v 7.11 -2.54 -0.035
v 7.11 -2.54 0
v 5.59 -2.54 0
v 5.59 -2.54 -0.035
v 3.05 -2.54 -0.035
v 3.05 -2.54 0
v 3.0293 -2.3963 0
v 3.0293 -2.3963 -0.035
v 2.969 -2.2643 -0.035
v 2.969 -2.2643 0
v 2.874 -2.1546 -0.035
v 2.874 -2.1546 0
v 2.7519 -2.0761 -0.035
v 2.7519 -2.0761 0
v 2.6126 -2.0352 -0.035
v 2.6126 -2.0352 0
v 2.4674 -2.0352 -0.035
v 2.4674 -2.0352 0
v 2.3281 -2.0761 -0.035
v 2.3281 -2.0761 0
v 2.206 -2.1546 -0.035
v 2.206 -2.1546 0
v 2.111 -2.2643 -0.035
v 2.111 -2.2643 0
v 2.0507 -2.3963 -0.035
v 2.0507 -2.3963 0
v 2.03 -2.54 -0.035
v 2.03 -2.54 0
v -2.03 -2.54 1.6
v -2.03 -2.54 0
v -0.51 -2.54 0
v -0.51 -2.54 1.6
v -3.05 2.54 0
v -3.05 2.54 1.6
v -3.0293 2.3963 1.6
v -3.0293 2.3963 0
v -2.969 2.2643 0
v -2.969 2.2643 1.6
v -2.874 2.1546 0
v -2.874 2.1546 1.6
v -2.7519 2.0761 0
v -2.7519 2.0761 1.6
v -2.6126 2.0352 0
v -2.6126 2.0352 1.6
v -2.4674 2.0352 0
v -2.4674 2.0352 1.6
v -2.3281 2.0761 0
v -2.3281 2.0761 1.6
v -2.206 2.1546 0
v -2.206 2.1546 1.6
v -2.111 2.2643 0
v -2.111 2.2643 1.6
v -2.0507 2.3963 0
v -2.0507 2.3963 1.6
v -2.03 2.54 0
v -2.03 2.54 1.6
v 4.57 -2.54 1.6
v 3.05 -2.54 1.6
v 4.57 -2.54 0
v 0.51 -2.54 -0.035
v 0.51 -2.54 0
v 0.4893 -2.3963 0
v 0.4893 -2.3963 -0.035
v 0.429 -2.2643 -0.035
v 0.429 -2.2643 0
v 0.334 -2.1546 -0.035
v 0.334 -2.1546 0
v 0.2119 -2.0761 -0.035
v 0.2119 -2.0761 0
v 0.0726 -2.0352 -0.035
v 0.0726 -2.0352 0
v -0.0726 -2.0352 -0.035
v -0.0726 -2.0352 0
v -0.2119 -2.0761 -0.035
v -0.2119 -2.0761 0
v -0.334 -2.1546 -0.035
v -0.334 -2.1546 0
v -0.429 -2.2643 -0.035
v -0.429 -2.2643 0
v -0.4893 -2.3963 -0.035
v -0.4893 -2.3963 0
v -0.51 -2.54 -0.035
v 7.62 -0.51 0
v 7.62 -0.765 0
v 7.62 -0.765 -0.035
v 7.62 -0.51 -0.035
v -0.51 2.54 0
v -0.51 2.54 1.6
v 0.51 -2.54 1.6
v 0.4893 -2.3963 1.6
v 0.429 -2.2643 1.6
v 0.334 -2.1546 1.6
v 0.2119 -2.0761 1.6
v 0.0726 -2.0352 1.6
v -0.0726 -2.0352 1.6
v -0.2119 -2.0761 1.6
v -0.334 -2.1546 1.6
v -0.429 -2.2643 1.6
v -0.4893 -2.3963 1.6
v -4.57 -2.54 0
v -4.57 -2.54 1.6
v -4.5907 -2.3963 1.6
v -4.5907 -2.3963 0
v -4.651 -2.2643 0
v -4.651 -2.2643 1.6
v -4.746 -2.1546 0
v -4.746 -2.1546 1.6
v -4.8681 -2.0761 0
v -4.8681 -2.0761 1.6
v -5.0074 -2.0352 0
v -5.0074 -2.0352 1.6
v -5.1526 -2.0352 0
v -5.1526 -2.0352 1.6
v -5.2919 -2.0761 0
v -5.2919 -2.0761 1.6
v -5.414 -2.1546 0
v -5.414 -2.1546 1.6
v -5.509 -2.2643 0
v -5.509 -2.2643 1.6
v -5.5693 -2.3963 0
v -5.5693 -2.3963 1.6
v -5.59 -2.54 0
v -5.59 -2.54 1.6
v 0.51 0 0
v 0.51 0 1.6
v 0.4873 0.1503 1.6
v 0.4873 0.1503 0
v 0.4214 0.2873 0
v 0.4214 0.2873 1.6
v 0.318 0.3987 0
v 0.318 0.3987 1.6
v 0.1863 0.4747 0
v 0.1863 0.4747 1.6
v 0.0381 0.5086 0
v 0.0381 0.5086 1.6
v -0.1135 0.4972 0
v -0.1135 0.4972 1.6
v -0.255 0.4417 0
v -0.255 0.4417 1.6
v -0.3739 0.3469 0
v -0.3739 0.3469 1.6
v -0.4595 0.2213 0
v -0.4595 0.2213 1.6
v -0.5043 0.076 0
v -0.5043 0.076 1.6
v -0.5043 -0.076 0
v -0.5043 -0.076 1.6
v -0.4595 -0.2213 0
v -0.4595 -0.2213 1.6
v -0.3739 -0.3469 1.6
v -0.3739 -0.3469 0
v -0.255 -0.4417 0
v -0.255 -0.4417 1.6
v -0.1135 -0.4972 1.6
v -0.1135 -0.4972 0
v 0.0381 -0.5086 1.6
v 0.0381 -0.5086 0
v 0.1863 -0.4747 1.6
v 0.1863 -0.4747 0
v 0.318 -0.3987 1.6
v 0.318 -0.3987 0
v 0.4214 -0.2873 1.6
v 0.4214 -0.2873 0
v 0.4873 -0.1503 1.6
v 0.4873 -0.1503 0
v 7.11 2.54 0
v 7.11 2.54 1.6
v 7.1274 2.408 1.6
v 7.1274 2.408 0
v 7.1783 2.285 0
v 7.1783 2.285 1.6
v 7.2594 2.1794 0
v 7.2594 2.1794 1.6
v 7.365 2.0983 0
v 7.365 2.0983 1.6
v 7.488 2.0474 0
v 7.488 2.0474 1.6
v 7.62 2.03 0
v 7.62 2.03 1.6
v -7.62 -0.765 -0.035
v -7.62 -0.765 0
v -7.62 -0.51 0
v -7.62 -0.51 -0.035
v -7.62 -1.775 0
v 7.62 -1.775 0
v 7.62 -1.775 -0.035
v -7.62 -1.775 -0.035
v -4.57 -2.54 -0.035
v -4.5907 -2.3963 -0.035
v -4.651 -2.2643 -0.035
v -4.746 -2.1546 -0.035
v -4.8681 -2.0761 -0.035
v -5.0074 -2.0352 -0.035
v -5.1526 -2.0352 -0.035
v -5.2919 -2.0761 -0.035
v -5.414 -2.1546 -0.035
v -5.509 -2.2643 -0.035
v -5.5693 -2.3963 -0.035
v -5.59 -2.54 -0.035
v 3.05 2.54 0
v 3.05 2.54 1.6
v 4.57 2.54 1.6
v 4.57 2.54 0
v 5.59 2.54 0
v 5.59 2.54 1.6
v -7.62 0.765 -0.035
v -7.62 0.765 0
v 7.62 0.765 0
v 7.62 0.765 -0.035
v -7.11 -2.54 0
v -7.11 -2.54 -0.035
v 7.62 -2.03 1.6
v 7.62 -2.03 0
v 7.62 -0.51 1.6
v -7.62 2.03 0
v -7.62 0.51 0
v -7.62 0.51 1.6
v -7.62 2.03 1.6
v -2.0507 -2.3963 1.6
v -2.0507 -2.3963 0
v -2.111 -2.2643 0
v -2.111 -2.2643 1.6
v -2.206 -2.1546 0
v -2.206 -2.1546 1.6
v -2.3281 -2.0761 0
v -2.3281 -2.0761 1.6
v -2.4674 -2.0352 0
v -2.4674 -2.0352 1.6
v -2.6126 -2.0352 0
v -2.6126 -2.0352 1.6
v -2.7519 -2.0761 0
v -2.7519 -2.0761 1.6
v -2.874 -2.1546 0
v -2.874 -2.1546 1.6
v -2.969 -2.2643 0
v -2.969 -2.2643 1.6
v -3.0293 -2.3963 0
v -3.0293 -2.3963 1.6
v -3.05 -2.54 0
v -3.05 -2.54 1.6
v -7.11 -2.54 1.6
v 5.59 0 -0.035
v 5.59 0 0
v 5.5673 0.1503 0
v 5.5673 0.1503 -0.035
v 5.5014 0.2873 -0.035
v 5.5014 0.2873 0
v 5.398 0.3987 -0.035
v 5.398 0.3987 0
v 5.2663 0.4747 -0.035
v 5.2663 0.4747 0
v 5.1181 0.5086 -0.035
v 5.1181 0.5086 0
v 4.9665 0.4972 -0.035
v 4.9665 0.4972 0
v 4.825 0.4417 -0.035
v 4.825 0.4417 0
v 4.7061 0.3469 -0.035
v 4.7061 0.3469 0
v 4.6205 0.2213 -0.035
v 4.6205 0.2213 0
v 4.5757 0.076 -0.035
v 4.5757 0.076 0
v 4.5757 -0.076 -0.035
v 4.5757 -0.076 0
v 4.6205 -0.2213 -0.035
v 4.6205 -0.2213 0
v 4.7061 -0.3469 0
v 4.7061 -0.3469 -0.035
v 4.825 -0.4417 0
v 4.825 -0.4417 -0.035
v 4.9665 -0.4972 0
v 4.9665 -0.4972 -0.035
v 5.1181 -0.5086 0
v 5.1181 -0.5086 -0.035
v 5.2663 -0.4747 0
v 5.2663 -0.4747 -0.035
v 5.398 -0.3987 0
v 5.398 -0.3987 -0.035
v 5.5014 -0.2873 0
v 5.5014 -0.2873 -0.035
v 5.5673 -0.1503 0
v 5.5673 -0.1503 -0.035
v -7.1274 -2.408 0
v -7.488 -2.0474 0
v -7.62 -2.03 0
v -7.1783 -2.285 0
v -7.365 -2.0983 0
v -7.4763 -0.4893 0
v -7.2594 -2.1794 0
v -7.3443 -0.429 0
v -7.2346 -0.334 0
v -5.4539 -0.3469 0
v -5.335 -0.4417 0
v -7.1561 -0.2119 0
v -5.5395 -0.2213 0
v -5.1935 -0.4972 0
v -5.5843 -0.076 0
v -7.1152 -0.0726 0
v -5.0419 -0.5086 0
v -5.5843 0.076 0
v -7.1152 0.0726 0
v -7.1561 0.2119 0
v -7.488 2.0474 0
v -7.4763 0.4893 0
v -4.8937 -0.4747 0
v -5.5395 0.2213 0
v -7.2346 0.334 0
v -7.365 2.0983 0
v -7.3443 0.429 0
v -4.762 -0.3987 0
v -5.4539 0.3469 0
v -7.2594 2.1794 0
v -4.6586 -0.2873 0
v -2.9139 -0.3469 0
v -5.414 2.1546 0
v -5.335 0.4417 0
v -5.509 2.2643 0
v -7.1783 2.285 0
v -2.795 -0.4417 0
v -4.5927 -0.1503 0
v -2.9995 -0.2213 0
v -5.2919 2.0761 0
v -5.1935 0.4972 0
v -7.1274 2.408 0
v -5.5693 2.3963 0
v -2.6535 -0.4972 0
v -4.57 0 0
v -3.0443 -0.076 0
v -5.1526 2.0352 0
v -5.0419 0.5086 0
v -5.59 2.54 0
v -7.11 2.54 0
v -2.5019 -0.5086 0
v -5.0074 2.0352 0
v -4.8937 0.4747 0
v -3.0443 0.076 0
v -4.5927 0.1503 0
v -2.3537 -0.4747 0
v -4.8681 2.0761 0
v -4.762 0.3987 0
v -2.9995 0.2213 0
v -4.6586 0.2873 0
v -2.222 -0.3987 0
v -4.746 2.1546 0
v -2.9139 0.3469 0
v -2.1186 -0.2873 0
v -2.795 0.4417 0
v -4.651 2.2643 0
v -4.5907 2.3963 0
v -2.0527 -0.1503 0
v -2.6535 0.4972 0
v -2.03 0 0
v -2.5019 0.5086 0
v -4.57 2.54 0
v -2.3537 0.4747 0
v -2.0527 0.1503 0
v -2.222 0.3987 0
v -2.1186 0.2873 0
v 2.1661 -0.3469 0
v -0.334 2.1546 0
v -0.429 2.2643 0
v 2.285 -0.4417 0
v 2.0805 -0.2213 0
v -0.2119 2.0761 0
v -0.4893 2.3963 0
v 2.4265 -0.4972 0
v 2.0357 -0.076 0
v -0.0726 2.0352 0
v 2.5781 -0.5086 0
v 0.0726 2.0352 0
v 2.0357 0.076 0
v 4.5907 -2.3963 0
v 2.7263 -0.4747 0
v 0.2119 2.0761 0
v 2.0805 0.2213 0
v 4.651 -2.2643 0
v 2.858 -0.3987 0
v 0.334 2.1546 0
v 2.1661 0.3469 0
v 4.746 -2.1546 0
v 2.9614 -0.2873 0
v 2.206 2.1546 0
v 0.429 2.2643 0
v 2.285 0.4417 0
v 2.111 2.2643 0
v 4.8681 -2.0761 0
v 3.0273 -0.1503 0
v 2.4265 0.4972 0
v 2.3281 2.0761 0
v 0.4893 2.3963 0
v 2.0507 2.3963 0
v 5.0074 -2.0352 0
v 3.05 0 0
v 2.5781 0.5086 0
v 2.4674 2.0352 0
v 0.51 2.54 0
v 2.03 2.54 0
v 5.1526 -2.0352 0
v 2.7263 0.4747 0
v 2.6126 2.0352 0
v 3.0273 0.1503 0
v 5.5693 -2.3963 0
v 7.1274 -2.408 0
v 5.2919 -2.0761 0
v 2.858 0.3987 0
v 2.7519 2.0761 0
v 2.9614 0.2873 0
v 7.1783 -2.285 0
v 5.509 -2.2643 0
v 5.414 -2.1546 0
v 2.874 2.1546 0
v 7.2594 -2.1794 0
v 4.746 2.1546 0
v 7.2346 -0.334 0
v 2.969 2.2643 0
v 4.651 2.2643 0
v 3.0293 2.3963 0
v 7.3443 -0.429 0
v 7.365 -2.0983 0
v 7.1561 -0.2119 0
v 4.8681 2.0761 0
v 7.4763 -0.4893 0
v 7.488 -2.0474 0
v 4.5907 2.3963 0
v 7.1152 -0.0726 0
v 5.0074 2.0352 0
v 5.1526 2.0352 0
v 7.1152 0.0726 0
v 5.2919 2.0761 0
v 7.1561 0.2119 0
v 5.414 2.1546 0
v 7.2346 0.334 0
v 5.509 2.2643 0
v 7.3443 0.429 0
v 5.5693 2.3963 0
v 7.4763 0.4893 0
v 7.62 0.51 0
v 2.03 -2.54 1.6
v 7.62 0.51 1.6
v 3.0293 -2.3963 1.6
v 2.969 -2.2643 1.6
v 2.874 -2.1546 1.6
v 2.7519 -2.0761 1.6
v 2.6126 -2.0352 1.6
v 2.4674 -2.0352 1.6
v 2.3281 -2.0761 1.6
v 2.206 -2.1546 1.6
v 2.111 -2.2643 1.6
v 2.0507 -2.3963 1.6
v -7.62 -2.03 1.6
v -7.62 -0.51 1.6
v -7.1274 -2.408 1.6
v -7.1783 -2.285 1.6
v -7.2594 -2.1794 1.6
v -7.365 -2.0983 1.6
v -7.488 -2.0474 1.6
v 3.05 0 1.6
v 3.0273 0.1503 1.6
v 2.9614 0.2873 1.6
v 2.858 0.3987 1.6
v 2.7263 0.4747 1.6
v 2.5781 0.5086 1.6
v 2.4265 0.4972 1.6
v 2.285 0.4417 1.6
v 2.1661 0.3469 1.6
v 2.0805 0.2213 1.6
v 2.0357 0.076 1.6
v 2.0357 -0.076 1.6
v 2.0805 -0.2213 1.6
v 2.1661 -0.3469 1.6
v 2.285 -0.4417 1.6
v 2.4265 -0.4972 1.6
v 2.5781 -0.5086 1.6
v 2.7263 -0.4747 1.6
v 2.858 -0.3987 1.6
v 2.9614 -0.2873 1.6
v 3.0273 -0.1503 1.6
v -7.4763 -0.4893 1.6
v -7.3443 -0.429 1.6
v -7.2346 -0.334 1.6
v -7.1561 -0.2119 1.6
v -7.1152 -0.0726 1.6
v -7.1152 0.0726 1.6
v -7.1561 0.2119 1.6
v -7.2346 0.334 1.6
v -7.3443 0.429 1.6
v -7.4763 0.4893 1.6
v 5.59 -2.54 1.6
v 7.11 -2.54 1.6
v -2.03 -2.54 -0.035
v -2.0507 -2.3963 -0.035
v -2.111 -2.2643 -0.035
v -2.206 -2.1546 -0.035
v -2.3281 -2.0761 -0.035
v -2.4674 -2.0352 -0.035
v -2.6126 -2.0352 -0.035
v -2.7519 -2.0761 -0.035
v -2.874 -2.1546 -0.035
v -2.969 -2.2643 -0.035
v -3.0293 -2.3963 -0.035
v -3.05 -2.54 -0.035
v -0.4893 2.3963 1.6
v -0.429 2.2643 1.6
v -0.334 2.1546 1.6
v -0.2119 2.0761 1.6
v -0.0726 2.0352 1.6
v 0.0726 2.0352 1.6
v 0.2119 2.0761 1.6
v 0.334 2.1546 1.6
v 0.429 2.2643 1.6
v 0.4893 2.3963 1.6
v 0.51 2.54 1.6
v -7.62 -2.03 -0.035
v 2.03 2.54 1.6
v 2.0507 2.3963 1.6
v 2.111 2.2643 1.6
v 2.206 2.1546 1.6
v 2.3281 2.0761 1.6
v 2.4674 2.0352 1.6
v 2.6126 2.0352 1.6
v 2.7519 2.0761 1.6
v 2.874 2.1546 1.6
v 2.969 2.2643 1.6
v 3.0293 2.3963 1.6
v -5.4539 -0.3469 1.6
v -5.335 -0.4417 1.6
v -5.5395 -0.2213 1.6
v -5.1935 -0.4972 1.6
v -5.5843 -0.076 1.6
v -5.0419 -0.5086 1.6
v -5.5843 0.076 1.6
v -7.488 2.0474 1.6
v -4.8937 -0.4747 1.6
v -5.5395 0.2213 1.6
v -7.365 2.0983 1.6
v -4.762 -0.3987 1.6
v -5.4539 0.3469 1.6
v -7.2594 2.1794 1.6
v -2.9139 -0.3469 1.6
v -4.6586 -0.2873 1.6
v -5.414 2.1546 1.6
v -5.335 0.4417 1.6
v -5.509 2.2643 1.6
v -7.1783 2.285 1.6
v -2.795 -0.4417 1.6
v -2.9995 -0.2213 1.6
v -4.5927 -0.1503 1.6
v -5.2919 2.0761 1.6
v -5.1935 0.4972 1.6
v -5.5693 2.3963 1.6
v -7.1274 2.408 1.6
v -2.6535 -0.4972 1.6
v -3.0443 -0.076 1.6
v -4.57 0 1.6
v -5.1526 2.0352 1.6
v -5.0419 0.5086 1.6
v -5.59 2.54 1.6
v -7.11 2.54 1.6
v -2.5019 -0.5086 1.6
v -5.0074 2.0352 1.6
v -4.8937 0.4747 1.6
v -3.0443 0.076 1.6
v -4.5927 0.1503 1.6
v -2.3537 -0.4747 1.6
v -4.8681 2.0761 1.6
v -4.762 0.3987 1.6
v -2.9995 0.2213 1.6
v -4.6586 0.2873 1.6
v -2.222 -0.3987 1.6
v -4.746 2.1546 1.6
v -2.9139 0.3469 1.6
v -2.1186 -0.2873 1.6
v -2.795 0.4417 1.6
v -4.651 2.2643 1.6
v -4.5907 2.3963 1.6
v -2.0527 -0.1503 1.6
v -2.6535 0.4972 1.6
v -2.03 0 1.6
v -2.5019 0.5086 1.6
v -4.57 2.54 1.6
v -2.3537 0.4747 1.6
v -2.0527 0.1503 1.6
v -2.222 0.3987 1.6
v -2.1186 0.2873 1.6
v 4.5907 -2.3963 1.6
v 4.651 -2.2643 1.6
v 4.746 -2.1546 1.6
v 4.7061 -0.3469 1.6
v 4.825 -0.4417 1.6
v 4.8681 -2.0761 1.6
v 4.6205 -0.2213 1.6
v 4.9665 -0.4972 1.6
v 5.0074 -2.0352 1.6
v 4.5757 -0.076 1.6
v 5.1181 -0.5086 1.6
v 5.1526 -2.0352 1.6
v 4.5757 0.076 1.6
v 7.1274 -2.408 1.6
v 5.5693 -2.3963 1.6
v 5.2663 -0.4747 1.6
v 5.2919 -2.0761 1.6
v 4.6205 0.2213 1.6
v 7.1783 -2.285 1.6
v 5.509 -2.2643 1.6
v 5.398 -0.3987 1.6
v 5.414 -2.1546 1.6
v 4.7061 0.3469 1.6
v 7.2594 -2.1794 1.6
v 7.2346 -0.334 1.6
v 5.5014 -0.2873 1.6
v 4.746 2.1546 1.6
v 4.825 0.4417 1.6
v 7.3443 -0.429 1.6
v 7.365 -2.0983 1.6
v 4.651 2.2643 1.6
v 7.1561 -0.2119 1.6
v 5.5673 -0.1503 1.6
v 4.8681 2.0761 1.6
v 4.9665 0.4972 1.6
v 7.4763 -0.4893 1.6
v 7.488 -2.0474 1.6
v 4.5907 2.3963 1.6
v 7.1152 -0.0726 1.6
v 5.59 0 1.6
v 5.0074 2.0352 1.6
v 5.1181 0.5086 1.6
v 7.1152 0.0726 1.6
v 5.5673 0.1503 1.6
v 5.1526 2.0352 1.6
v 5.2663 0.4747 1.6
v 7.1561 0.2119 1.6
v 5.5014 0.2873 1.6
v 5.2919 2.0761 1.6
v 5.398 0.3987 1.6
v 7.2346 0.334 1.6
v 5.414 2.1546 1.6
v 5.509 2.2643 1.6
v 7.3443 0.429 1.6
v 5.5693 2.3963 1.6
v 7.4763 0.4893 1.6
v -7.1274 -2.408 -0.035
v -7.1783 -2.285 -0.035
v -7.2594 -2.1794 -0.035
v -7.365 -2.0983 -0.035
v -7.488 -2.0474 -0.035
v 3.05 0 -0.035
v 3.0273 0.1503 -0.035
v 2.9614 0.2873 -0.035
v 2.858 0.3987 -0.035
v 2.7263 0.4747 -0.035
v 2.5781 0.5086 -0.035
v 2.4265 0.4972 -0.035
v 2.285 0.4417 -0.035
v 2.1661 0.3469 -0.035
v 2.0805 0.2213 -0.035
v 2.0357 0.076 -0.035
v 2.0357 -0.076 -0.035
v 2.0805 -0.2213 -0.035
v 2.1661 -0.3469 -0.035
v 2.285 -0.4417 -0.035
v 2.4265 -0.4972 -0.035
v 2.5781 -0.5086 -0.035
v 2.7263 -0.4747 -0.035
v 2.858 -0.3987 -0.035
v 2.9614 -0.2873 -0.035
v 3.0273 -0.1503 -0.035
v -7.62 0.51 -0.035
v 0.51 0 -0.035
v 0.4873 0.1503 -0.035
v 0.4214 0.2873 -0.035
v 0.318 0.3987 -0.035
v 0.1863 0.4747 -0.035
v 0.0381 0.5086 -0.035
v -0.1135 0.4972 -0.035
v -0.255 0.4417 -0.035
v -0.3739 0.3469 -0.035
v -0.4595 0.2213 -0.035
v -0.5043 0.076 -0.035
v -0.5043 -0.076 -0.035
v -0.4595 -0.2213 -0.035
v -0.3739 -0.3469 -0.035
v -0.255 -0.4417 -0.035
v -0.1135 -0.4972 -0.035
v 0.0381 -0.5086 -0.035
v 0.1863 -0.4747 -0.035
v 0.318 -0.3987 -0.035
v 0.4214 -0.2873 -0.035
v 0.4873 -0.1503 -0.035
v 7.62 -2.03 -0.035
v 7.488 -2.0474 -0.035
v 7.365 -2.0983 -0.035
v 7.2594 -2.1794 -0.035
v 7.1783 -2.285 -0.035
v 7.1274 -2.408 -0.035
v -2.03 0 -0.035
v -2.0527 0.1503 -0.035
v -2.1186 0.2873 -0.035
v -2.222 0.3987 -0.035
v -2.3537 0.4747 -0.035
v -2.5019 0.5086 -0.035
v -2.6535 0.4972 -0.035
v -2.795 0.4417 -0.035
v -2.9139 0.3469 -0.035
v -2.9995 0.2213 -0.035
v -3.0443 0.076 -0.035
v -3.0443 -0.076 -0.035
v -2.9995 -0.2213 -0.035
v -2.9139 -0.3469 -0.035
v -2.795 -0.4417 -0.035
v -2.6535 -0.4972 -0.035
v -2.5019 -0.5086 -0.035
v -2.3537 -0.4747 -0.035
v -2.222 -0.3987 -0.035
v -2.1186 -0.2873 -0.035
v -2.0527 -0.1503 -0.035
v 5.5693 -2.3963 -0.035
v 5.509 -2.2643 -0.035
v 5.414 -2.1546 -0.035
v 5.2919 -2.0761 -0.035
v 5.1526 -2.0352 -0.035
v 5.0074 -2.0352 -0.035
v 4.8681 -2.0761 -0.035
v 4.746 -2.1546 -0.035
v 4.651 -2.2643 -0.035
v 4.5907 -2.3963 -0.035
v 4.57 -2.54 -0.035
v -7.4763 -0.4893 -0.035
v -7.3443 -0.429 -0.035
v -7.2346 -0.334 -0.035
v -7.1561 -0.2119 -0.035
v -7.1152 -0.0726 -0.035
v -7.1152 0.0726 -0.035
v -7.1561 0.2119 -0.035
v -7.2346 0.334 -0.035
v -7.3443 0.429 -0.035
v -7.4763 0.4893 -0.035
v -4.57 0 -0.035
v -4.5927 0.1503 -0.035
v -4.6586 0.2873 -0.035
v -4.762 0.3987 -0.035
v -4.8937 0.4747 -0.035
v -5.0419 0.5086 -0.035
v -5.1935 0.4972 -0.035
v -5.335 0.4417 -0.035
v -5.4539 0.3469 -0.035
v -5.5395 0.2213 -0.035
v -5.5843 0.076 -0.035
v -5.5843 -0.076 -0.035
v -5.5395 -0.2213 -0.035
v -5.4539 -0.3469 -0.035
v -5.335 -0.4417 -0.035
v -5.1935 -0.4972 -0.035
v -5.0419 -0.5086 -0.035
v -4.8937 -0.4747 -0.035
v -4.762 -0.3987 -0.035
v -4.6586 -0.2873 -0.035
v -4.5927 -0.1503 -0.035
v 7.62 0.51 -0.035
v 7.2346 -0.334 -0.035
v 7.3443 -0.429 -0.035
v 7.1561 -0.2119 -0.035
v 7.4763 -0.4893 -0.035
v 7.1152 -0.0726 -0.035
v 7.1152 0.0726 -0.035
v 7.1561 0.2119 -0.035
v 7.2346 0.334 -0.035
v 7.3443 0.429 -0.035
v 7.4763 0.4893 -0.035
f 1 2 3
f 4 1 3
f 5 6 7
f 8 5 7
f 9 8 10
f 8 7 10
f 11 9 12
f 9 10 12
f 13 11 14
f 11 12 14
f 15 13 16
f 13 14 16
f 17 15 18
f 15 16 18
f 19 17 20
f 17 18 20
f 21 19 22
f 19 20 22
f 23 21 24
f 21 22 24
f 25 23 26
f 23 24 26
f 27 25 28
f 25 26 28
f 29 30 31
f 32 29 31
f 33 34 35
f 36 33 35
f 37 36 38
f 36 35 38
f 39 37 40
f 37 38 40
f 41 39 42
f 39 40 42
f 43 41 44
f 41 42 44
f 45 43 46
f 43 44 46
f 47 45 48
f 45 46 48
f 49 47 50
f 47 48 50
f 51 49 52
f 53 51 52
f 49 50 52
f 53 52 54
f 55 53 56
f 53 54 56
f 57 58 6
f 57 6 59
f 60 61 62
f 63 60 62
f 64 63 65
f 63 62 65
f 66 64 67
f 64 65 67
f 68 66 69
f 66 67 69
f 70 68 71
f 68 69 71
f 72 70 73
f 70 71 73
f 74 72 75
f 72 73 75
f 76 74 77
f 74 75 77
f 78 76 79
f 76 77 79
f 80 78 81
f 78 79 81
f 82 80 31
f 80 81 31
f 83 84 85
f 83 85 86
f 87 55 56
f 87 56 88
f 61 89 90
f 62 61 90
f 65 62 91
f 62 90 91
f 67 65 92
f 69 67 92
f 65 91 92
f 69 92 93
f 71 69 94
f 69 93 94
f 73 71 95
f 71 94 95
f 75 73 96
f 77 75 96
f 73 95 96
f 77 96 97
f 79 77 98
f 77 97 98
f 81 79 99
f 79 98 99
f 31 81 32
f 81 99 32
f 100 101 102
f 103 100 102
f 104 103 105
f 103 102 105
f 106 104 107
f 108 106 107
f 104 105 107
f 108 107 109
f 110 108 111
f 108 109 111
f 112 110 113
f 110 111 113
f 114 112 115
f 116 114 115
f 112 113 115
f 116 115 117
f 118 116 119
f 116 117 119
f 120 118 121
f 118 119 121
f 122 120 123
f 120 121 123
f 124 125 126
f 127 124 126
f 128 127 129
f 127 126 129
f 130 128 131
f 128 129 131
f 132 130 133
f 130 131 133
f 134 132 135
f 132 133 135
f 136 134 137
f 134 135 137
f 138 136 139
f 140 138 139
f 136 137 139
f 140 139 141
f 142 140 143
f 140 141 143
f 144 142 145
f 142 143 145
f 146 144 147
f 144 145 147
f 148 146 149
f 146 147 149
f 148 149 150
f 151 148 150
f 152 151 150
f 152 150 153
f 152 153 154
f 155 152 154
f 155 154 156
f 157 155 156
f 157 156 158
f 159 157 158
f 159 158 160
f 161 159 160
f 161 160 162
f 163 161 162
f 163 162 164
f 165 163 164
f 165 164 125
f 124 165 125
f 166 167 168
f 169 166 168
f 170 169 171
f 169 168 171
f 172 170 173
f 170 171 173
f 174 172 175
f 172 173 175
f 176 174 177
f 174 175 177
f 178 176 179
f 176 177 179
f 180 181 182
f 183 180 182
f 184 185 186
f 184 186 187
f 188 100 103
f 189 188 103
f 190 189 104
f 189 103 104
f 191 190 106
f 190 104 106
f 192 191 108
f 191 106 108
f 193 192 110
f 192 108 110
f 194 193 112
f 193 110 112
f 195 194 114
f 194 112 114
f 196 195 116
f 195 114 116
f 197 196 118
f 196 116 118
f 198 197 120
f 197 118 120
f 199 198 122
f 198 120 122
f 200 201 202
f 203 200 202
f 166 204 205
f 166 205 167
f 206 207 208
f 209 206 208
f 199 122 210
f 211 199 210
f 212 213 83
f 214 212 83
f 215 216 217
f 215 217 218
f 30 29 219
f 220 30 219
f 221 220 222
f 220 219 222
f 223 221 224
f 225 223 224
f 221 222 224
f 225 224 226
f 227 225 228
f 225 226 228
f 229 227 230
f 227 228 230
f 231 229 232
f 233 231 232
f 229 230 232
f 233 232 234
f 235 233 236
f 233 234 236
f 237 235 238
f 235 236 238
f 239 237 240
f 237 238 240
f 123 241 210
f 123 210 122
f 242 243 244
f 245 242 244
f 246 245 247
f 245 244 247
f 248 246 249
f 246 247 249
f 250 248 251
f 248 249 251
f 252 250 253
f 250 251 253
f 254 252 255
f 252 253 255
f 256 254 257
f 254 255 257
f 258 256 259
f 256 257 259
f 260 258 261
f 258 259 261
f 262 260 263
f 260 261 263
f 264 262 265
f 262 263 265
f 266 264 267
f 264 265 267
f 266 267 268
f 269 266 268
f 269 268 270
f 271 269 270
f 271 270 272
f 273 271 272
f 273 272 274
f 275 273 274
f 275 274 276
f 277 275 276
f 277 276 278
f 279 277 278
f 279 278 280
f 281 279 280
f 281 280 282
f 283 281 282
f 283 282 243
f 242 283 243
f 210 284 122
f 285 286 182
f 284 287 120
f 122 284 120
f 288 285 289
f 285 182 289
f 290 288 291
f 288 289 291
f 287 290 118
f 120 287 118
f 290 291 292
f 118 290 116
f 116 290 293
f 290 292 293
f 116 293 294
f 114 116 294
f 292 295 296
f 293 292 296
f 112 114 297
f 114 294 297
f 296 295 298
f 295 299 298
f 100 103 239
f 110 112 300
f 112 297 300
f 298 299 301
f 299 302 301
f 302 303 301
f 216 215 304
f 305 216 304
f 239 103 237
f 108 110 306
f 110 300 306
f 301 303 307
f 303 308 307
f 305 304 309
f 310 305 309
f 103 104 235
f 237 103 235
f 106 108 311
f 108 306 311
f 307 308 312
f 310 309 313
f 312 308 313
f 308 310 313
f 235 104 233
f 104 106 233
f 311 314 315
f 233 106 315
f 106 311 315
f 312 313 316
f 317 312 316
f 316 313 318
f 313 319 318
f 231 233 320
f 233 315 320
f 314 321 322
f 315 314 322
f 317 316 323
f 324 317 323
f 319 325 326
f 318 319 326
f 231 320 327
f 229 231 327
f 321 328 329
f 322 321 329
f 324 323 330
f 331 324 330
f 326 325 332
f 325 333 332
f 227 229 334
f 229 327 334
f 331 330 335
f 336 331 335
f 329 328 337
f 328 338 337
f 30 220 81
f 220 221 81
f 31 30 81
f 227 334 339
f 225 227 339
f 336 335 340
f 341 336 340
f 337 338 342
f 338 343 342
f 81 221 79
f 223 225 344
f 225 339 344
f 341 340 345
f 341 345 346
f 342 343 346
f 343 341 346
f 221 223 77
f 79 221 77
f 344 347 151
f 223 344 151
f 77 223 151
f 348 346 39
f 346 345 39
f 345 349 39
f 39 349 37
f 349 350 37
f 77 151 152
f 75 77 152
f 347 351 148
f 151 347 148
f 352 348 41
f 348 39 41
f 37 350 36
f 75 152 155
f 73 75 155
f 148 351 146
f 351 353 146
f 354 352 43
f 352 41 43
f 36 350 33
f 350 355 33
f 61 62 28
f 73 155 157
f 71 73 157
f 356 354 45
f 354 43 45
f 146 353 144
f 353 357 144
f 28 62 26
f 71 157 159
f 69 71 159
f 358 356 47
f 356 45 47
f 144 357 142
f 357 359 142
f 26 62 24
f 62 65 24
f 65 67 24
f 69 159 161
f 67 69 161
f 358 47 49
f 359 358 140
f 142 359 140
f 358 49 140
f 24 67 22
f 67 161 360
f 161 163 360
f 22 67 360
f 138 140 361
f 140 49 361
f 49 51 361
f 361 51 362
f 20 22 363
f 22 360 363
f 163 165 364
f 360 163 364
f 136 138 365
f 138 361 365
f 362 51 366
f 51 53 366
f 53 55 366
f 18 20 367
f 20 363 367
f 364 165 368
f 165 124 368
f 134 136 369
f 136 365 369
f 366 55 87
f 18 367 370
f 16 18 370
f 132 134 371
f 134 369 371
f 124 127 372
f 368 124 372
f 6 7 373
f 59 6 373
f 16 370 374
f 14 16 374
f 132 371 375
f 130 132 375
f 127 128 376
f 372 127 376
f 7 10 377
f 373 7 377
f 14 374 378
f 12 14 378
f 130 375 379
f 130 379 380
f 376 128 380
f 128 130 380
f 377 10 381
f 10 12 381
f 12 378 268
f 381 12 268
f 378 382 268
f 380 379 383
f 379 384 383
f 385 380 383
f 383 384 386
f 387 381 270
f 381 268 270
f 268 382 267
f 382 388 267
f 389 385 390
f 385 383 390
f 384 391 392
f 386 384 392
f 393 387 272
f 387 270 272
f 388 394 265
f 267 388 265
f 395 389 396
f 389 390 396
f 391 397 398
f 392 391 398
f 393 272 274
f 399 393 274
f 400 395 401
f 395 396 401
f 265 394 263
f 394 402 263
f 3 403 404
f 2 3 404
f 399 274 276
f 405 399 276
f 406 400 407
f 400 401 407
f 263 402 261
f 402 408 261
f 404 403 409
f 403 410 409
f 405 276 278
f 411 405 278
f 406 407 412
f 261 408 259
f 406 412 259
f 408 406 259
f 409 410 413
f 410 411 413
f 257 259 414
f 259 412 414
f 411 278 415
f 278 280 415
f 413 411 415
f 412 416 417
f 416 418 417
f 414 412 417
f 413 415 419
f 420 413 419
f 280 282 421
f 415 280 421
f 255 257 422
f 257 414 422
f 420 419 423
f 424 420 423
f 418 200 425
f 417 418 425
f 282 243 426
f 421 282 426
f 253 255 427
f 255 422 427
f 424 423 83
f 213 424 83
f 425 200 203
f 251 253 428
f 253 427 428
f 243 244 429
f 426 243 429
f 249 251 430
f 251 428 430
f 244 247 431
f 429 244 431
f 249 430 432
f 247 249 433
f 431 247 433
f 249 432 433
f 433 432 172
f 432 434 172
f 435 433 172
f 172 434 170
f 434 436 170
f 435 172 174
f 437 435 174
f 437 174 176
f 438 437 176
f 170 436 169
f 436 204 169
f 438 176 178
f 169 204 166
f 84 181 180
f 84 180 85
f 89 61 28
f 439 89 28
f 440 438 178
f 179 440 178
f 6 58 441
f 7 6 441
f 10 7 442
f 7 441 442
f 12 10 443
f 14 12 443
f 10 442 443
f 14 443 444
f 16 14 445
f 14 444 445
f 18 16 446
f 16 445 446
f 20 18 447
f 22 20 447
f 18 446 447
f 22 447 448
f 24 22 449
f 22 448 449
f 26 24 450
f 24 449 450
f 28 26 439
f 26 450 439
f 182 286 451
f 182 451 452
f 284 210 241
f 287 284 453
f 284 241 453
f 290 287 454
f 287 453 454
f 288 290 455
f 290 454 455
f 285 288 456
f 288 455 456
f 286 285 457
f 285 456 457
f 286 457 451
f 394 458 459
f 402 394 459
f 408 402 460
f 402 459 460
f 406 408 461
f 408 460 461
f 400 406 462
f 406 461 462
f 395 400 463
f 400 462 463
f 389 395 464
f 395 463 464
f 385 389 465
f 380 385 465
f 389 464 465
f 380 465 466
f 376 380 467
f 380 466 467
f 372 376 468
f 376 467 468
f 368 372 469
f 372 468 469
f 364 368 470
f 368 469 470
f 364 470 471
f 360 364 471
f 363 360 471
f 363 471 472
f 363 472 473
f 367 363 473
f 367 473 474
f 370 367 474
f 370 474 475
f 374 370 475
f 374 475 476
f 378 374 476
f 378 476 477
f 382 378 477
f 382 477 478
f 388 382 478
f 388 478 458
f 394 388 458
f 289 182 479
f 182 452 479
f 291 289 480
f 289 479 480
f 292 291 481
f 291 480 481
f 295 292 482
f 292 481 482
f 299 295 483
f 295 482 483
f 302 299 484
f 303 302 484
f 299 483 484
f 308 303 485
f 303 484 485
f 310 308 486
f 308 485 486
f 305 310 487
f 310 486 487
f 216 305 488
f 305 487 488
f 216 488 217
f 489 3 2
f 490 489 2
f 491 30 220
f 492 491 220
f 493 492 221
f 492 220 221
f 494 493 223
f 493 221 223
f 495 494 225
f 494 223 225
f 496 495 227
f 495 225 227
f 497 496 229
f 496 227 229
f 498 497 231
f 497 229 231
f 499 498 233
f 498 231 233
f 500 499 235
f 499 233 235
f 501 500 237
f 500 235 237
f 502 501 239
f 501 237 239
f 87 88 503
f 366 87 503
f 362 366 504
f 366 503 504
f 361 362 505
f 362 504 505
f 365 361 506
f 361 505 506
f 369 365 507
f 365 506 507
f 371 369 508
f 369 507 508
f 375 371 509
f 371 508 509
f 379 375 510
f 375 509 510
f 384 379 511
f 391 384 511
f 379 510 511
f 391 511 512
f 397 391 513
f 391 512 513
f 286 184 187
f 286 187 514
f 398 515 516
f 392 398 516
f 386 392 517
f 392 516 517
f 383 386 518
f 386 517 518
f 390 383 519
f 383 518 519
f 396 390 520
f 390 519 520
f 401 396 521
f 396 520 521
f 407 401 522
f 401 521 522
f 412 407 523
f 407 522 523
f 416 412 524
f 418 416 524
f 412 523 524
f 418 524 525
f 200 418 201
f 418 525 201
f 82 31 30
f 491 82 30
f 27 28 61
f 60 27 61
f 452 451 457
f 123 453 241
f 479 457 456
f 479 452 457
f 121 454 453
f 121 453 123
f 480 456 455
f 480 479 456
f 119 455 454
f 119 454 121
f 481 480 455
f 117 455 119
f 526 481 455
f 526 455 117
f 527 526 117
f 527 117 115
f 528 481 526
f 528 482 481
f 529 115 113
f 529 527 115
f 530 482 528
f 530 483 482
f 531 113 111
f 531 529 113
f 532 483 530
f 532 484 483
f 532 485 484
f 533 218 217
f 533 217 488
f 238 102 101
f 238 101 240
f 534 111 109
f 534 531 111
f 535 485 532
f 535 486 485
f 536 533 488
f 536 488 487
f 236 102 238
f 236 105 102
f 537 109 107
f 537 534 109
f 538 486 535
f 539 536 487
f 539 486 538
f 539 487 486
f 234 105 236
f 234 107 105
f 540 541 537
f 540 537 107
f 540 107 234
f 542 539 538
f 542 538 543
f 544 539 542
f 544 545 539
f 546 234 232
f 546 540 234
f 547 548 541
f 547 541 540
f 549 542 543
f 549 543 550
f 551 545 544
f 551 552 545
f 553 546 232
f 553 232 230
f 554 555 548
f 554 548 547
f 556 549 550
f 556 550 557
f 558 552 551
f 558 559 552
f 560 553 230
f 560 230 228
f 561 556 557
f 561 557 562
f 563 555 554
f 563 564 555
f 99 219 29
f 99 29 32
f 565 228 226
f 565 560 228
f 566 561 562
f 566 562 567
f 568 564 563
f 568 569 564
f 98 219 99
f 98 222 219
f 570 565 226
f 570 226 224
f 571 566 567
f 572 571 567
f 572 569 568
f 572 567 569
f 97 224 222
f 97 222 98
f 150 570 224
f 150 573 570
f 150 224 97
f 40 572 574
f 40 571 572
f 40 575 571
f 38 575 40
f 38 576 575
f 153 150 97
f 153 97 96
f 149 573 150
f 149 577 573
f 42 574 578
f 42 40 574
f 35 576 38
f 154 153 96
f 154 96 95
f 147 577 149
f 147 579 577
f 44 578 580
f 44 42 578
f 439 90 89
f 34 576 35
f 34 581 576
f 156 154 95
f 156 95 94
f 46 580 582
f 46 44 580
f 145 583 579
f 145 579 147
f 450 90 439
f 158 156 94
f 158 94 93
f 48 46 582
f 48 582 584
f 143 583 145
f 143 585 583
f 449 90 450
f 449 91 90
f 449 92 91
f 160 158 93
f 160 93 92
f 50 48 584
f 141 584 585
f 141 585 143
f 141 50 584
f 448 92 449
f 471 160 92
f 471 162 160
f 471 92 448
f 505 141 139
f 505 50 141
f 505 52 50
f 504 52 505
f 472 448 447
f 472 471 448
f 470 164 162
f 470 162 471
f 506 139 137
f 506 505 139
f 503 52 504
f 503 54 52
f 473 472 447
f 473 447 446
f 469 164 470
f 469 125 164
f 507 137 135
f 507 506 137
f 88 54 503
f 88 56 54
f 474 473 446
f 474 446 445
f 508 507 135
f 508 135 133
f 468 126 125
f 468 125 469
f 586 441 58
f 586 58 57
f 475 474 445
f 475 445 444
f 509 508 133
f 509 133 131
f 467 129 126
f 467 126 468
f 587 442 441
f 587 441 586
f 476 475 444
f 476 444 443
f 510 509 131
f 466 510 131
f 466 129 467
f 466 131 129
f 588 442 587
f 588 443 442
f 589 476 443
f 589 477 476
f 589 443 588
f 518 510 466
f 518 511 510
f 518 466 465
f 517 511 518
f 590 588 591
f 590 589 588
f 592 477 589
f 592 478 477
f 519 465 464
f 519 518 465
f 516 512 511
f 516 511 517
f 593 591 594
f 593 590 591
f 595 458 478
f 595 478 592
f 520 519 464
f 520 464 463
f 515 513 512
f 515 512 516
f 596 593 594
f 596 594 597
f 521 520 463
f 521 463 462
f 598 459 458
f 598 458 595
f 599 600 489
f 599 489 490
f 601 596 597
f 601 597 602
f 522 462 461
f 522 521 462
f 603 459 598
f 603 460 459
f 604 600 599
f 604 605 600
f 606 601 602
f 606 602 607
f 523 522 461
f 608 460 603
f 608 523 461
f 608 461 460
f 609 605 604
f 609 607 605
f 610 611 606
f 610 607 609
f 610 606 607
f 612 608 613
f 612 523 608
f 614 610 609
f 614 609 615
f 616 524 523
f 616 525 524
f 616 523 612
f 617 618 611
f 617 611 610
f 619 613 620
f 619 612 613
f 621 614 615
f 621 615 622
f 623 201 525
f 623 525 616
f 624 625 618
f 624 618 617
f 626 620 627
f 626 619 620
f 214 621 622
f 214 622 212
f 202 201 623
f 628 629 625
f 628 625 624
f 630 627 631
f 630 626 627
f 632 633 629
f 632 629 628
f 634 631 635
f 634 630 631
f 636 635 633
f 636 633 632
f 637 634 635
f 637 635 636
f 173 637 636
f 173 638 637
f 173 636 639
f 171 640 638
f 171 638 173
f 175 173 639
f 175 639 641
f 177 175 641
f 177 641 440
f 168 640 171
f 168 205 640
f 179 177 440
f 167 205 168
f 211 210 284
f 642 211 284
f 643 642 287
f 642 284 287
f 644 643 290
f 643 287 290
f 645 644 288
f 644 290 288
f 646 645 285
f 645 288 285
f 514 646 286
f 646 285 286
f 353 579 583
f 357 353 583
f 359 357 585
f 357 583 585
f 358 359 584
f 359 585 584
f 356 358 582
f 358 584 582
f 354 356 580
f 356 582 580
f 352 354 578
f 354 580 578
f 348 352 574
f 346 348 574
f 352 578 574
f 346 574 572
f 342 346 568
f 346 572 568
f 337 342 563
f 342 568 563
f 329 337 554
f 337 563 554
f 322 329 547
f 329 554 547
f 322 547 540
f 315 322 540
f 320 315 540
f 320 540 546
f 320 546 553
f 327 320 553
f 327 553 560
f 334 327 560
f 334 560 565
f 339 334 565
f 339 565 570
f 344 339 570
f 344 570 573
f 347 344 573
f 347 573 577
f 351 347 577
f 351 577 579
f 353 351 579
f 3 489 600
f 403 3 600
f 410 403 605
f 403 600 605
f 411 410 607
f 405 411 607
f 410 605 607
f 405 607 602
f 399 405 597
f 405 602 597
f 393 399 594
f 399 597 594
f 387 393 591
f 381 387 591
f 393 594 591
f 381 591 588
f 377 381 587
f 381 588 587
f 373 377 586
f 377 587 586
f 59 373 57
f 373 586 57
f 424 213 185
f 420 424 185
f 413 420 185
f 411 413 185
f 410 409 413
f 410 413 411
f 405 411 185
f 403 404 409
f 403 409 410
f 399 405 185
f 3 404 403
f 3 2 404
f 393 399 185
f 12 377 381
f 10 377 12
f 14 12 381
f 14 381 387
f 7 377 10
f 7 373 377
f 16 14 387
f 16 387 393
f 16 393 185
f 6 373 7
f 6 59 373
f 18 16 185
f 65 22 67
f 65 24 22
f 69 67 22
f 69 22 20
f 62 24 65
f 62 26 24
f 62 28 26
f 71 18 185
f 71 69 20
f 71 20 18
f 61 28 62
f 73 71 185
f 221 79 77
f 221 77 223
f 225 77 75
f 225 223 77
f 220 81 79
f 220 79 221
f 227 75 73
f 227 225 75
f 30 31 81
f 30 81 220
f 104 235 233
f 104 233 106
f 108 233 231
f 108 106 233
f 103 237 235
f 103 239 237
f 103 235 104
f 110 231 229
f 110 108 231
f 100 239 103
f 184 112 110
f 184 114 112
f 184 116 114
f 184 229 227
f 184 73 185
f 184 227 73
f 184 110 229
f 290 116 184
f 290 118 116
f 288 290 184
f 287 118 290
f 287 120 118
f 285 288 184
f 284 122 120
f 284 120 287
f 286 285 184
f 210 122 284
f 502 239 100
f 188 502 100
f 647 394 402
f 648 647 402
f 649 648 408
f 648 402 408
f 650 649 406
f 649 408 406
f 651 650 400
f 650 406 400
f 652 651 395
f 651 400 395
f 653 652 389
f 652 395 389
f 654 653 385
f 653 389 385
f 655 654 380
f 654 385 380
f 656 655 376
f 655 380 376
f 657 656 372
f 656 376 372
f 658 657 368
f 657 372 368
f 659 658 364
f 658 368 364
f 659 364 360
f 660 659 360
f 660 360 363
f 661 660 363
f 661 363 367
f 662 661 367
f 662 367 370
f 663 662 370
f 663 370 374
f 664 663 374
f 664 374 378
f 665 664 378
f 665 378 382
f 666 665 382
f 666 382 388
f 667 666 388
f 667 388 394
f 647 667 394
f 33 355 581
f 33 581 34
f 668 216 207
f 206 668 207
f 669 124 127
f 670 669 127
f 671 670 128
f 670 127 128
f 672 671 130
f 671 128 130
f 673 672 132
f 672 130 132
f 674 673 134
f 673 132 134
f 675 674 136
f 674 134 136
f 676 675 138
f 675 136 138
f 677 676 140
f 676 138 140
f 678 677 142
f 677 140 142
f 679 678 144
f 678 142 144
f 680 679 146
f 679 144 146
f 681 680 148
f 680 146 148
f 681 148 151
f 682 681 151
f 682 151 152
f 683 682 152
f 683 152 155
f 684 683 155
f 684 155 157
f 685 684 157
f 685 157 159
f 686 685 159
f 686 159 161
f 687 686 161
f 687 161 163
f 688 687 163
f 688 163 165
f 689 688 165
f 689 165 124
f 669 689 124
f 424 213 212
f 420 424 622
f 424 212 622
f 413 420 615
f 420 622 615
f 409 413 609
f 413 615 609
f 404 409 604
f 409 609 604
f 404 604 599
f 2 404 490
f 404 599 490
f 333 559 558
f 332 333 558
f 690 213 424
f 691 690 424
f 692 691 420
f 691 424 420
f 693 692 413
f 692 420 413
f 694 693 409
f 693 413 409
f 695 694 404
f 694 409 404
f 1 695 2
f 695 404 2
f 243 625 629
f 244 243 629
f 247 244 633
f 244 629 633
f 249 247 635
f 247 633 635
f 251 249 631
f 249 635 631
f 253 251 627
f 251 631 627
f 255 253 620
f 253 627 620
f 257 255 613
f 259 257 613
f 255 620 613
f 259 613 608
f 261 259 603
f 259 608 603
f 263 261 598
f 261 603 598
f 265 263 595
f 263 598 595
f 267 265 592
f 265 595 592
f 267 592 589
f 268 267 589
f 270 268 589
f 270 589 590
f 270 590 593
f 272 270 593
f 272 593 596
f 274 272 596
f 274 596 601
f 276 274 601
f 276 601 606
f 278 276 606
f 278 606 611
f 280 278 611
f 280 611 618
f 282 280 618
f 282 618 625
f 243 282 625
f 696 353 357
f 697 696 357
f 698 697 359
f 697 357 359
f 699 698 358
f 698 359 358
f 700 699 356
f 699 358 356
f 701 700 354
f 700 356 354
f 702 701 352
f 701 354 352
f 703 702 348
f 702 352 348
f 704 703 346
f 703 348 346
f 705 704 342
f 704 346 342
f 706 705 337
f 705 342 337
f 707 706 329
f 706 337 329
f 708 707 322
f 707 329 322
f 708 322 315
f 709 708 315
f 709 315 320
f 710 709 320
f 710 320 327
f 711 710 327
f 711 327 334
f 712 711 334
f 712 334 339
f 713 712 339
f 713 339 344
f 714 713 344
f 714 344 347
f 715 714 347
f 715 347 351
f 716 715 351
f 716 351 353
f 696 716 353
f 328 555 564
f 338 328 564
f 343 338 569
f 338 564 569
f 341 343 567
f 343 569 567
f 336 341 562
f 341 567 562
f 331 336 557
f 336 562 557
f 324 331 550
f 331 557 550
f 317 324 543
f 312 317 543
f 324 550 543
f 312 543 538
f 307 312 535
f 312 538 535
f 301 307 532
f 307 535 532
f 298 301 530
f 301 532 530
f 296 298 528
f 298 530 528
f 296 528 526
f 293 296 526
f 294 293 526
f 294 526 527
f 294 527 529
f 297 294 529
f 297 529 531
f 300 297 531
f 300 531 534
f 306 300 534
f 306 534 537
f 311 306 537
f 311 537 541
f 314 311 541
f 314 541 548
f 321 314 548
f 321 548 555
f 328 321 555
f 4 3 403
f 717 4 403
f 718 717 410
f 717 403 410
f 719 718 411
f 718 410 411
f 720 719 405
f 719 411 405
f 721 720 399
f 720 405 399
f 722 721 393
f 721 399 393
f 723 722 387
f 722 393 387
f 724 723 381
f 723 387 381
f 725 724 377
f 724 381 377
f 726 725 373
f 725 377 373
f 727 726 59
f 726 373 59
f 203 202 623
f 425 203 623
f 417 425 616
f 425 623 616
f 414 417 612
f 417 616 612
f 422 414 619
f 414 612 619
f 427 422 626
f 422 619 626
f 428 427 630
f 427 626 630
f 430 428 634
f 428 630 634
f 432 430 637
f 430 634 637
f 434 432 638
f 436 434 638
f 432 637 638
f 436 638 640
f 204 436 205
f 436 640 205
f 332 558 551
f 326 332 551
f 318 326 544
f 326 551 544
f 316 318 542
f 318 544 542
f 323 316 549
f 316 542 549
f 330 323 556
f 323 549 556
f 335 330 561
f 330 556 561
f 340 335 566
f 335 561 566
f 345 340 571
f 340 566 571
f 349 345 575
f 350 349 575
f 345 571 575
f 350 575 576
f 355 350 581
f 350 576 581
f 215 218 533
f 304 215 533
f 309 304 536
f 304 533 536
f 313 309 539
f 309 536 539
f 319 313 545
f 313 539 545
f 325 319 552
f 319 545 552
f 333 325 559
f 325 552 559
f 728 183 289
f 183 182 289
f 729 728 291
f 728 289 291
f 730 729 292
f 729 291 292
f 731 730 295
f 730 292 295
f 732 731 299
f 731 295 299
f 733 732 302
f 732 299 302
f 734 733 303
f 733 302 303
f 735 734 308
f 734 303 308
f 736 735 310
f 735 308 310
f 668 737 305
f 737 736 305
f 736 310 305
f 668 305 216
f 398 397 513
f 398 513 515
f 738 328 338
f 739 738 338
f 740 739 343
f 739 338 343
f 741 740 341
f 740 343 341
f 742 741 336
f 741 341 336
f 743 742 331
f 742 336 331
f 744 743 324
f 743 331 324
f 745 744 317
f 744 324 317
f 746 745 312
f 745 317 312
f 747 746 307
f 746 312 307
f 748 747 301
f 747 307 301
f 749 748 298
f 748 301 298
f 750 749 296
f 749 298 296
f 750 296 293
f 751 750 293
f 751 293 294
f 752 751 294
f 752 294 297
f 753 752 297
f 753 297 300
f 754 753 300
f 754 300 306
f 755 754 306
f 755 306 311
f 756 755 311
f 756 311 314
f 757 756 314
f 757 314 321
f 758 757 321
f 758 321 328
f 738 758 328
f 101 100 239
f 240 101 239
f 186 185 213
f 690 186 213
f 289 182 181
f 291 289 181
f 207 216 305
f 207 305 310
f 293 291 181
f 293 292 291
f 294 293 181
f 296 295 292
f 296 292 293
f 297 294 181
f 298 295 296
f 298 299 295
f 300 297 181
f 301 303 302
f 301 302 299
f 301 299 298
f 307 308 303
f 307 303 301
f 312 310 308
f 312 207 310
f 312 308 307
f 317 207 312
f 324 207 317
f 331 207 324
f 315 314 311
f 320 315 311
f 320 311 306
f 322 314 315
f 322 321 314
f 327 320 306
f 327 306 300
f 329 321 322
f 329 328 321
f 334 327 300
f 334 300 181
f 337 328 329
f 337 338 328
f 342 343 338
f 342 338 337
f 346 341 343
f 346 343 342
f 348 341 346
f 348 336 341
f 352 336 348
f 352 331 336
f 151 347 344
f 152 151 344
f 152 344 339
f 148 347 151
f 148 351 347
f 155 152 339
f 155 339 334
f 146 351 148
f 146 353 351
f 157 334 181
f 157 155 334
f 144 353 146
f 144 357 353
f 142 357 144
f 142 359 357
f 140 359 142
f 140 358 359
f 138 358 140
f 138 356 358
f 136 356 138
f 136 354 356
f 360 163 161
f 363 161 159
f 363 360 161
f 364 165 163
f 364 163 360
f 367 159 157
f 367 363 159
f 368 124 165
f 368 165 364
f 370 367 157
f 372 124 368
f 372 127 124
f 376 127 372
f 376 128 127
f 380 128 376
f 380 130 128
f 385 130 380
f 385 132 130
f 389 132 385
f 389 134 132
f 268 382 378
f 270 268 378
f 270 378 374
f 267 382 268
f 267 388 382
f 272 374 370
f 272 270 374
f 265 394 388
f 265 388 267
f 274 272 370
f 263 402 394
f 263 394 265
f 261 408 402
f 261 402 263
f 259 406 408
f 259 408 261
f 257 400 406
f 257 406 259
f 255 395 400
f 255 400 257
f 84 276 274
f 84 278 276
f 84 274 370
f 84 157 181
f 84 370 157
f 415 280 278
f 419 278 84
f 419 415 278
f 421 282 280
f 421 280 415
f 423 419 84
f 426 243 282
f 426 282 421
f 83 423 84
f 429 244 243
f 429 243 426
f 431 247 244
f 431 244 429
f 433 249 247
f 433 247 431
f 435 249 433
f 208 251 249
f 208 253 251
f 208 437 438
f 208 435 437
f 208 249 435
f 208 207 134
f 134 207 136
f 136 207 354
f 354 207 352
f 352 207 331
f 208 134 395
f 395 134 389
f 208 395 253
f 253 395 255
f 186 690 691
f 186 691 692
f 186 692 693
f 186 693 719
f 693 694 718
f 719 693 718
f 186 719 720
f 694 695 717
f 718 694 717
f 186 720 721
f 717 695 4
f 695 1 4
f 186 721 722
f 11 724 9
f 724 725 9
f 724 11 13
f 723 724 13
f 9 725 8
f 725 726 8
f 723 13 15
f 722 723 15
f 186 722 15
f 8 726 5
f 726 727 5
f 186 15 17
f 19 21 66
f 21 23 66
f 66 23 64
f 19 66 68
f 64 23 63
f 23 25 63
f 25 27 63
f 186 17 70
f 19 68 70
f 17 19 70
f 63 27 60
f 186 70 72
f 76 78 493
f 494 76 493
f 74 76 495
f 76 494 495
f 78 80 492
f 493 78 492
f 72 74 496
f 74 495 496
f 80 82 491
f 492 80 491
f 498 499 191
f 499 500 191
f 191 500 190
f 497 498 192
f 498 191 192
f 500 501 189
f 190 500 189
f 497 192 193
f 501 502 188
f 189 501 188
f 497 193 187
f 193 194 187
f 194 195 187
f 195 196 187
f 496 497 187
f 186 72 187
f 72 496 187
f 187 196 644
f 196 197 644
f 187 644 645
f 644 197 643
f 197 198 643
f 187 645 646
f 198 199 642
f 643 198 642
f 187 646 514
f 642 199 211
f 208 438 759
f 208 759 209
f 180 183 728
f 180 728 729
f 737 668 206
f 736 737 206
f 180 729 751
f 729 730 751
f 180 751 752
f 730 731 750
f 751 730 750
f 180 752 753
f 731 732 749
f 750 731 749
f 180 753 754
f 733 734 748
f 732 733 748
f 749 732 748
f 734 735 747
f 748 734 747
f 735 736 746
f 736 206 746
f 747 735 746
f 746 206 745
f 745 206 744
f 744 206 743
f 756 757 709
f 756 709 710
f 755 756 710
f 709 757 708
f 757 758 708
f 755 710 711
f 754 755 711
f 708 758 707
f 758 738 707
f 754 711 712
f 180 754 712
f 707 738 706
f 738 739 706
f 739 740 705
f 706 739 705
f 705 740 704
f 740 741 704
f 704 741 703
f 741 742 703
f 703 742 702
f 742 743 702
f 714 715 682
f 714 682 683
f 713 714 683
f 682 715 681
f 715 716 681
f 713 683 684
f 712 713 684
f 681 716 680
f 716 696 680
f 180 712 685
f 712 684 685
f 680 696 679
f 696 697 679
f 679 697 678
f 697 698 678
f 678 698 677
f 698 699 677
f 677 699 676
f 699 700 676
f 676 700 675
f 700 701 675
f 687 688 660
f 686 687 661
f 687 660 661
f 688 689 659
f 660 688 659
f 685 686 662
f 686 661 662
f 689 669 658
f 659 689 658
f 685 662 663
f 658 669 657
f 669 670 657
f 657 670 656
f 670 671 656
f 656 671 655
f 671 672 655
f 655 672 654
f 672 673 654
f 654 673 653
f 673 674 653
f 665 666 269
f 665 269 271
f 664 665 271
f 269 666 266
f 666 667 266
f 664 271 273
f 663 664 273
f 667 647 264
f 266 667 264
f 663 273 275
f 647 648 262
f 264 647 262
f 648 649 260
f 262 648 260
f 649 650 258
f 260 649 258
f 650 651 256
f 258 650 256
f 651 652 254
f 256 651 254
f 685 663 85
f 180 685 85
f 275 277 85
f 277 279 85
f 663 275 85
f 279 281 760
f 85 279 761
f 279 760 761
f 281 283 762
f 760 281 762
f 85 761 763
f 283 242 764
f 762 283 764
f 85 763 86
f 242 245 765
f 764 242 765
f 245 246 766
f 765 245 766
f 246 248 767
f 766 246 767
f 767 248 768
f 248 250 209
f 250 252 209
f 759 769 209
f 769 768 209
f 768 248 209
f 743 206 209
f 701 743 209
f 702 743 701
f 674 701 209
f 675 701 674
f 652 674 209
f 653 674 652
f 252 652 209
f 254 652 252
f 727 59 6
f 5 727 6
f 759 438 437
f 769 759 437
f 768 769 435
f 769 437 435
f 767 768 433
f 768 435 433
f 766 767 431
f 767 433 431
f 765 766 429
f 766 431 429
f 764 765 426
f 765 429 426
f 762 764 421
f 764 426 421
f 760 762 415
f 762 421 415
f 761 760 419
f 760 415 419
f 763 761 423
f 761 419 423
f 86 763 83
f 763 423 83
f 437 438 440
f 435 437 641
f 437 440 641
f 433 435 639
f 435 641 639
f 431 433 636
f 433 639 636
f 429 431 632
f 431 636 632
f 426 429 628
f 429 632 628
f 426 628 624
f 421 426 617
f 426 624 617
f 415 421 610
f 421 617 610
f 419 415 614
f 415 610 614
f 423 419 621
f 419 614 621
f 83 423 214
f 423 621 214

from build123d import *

# Parameters (mm, degrees)
SKETCH_W                     = 15.24
SKETCH_H                     = 5.08
PAD_DEPTH                    = 1.6
SKETCH001_R                  = 0.51
POCKET_DEPTH                 = 33.888707
SKETCH001_LINEARPATTERN_2_R  = 0.51
POCKET_LINEARPATTERN_2_DEPTH = 33.888707
SKETCH001_LINEARPATTERN_3_R  = 0.51
POCKET_LINEARPATTERN_3_DEPTH = 33.888707
SKETCH001_LINEARPATTERN_4_R  = 0.51
POCKET_LINEARPATTERN_4_DEPTH = 33.888707
SKETCH001_LINEARPATTERN_5_R  = 0.51
POCKET_LINEARPATTERN_5_DEPTH = 33.888707
SKETCH001_LINEARPATTERN_6_R  = 0.51
POCKET_LINEARPATTERN_6_DEPTH = 33.888707
SKETCH001_LINEARPATTERN_7_R  = 0.51
POCKET_LINEARPATTERN_7_DEPTH = 33.888707
LINEARPATTERN003_COUNT       = 3
LINEARPATTERN003_PITCH       = 2.54
SKETCH002_W                  = 15.24
SKETCH002_H                  = 1.53
PAD001_DEPTH                 = 0.035
SKETCH003_R                  = 0.51
POCKET001_DEPTH              = 0.036
LINEARPATTERN004_COUNT       = 7
LINEARPATTERN004_PITCH       = 2.54
SKETCH004_W                  = 15.24
SKETCH004_H                  = 0.765
PAD002_DEPTH                 = 0.035
SKETCH005_R                  = 0.51
POCKET002_DEPTH              = 0.036
LINEARPATTERN005_COUNT       = 7
LINEARPATTERN005_PITCH       = 2.54
BODY004_PLACEMENT_ANGLE      = 180


with BuildPart() as veroboard:
    # Sketch → Pad (new body)
    with BuildSketch(Plane.XY):
        Rectangle(SKETCH_W, SKETCH_H)
    extrude(amount=PAD_DEPTH)

    # Sketch001 → Pocket (cut, through all)
    with BuildSketch(Plane.XY.offset(1.6)):
        with Locations((-7.62, 2.54)):
            Circle(SKETCH001_R)
    pocket = extrude(amount=-POCKET_DEPTH, mode=Mode.SUBTRACT)

    # Sketch001 LinearPattern 2 → Pocket LinearPattern 2 (cut, through all)
    with BuildSketch(Plane(origin=(2.54, 0, 1.6), x_dir=(1, 0, 0), z_dir=(0, 0, 1))):
        with Locations((-7.62, 2.54)):
            Circle(SKETCH001_LINEARPATTERN_2_R)
    pocket_linearpattern_2 = extrude(amount=-POCKET_LINEARPATTERN_2_DEPTH, mode=Mode.SUBTRACT)

    # Sketch001 LinearPattern 3 → Pocket LinearPattern 3 (cut, through all)
    with BuildSketch(Plane(origin=(5.08, 0, 1.6), x_dir=(1, 0, 0), z_dir=(0, 0, 1))):
        with Locations((-7.62, 2.54)):
            Circle(SKETCH001_LINEARPATTERN_3_R)
    pocket_linearpattern_3 = extrude(amount=-POCKET_LINEARPATTERN_3_DEPTH, mode=Mode.SUBTRACT)

    # Sketch001 LinearPattern 4 → Pocket LinearPattern 4 (cut, through all)
    with BuildSketch(Plane(origin=(7.62, 0, 1.6), x_dir=(1, 0, 0), z_dir=(0, 0, 1))):
        with Locations((-7.62, 2.54)):
            Circle(SKETCH001_LINEARPATTERN_4_R)
    pocket_linearpattern_4 = extrude(amount=-POCKET_LINEARPATTERN_4_DEPTH, mode=Mode.SUBTRACT)

    # Sketch001 LinearPattern 5 → Pocket LinearPattern 5 (cut, through all)
    with BuildSketch(Plane(origin=(10.16, 0, 1.6), x_dir=(1, 0, 0), z_dir=(0, 0, 1))):
        with Locations((-7.62, 2.54)):
            Circle(SKETCH001_LINEARPATTERN_5_R)
    pocket_linearpattern_5 = extrude(amount=-POCKET_LINEARPATTERN_5_DEPTH, mode=Mode.SUBTRACT)

    # Sketch001 LinearPattern 6 → Pocket LinearPattern 6 (cut, through all)
    with BuildSketch(Plane(origin=(12.7, 0, 1.6), x_dir=(1, 0, 0), z_dir=(0, 0, 1))):
        with Locations((-7.62, 2.54)):
            Circle(SKETCH001_LINEARPATTERN_6_R)
    pocket_linearpattern_6 = extrude(amount=-POCKET_LINEARPATTERN_6_DEPTH, mode=Mode.SUBTRACT)

    # Sketch001 LinearPattern 7 → Pocket LinearPattern 7 (cut, through all)
    with BuildSketch(Plane(origin=(15.24, 0, 1.6), x_dir=(1, 0, 0), z_dir=(0, 0, 1))):
        with Locations((-7.62, 2.54)):
            Circle(SKETCH001_LINEARPATTERN_7_R)
    pocket_linearpattern_7 = extrude(amount=-POCKET_LINEARPATTERN_7_DEPTH, mode=Mode.SUBTRACT)

    # LinearPattern003: Pocket, Pocket LinearPattern 2, Pocket LinearPattern 3, Pocket LinearPattern 4, Pocket LinearPattern 5, Pocket LinearPattern 6, Pocket LinearPattern 7 ×3
    with Locations(*[(0, -i * LINEARPATTERN003_PITCH, 0) for i in range(1, LINEARPATTERN003_COUNT)]):
        add(pocket, mode=Mode.SUBTRACT)
        add(pocket_linearpattern_2, mode=Mode.SUBTRACT)
        add(pocket_linearpattern_3, mode=Mode.SUBTRACT)
        add(pocket_linearpattern_4, mode=Mode.SUBTRACT)
        add(pocket_linearpattern_5, mode=Mode.SUBTRACT)
        add(pocket_linearpattern_6, mode=Mode.SUBTRACT)
        add(pocket_linearpattern_7, mode=Mode.SUBTRACT)


with BuildPart() as fullcopperstripsarray:
    # Sketch002 → Pad001 (new body)
    with BuildSketch(Plane.XY):
        Rectangle(SKETCH002_W, SKETCH002_H)
    extrude(amount=-PAD001_DEPTH)

    # Sketch003 → Pocket001 (cut, through all)
    with BuildSketch(Plane.XY):
        with Locations((-7.62, 0)):
            Circle(SKETCH003_R)
    pocket001 = extrude(amount=-POCKET001_DEPTH, mode=Mode.SUBTRACT)

    # LinearPattern004: Pocket001 ×7
    with Locations(*[(i * LINEARPATTERN004_PITCH, 0, 0) for i in range(1, LINEARPATTERN004_COUNT)]):
        add(pocket001, mode=Mode.SUBTRACT)


with BuildPart() as partialcopperstripsclone:
    # Sketch004 → Pad002 (new body)
    with BuildSketch(Plane.XY):
        with Locations((0, 2.1575)):
            Rectangle(SKETCH004_W, SKETCH004_H)
    extrude(amount=-PAD002_DEPTH)

    # Sketch005 → Pocket002 (cut, through all)
    with BuildSketch(Plane.XY):
        with Locations((-7.62, 2.54)):
            Circle(SKETCH005_R)
    pocket002 = extrude(amount=-POCKET002_DEPTH, mode=Mode.SUBTRACT)

    # LinearPattern005: Pocket002 ×7
    with Locations(*[(i * LINEARPATTERN005_PITCH, 0, 0) for i in range(1, LINEARPATTERN005_COUNT)]):
        add(pocket002, mode=Mode.SUBTRACT)


with BuildPart() as partialcopperstripsclone_1:
    # Body004 placement: moved
    add(partialcopperstripsclone.part.rotate(Axis((0, 0, 0), (0, 0, 1)), BODY004_PLACEMENT_ANGLE))


solid = Compound([veroboard.part, fullcopperstripsarray.part, partialcopperstripsclone_1.part])
